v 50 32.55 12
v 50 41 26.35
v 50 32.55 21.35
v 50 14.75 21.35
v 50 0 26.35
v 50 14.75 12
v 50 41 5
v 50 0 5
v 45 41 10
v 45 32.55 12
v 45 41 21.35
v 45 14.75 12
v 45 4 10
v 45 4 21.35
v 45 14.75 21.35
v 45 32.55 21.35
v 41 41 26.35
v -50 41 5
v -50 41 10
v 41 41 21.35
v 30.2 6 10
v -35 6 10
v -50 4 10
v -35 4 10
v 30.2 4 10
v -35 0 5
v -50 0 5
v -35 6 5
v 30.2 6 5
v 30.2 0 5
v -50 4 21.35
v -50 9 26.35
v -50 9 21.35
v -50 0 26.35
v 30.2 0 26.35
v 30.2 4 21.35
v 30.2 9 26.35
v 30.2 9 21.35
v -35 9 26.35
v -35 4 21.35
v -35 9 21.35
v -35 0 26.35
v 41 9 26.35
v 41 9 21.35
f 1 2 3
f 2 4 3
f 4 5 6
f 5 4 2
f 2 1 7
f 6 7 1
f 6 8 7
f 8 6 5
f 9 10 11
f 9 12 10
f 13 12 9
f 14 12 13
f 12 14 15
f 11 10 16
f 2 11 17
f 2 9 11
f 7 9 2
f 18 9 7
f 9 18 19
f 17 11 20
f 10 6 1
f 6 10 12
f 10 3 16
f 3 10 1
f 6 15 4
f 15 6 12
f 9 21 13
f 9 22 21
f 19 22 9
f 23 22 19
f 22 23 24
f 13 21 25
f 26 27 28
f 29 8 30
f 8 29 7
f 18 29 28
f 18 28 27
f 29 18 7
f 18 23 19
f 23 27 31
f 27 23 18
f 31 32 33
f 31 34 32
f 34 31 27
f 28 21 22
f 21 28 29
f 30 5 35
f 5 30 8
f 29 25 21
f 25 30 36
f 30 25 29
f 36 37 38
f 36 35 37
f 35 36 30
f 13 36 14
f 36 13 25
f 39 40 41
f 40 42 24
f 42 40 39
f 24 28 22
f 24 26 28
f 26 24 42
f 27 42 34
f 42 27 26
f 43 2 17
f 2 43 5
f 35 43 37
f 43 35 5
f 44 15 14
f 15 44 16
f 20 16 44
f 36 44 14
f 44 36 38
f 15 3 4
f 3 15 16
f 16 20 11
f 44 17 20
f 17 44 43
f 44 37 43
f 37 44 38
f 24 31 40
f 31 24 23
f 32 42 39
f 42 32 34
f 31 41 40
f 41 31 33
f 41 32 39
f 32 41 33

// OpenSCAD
// file: ../robot_settings.scad
main_box_x = 100; // 96
main_box_y = 102;
main_box_z = 74; // 74.5

lfp_main_box_x = 66;
lfp_main_box_y = 152;
lfp_main_box_z = 93;

wall_thickness = 5;

rail_gap = 2;
rail_inset = 7;

rail_thickness = 7;
rail_length = 250;
 rail_width = 260;

lfp_battery_width = 65.5;
lfp_battery_depth = 150.5;
lfp_battery_height = 93;
lfp_battery_midterrace_width = 64.8;
lfp_battery_midterrace_depth = 150.2;
lfp_battery_midterrace_height = 7.8;
lfp_battery_topterrace_width = 62.8;
lfp_battery_topterrace_depth = 149.4;
lfp_battery_topterrace_height = 6.6;

// red right
// black left
lfp_battery_terminal_width = 9.2;
lfp_battery_terminal_depth = 9.5;
lfp_battery_terminal_depth_setback = 4.4;
lfp_battery_terminal_width_setback = 5.9;

raspberry_pi_screw_seperation_y = 57;
raspberry_pi_screw_seperation_z = 48;
raspberry_pi_peg_h = 5;

battery_box_peg_h = 6;
battery_box_peg_d = 9.5;
battery_box_peg_cutout = 5;

gears_module = 1;
pinion_gear_teeth = 32;
pinion_gear_width = 5;
pinion_gear_bore = 8;

gears_setback_distance = 25;
gear_post_height = 2 * pinion_gear_width + rail_thickness + 8 ;

steering_motor_mount_x = 45;
steering_motor_mount_y = 36;
steering_motor_mount_z = 18;
steering_motor_mount_setback_distance = gears_setback_distance + 16;

dc_motor_drivertype = "Teyleten"; // Teyleten
isAdafruit = (dc_motor_drivertype == "Adafruit");

drv8871_x = isAdafruit ? 20.3 : 21.6;
drv8871_y = isAdafruit ?  24 : 25;

drv8871_z = 2;
drv8871_screw_d = 2.5;
drv8871_solder_points_z = 2;

drv8871mount_edge_x = 1.5;
drv8871mount_edge_wall = 3;
drv8871mount_z = 5;
drv8871mount_x = drv8871_x +  drv8871mount_edge_wall - 2* drv8871mount_edge_x;
drv8871mount_y = 19;

drv8871_screw_distance = 15.64;
drv8871_solder_points_d = 1.66;
drv8871_solder_offset_y = 4.4;
drv8871_solder_inner_points_distance = 5;
drv8871_solder_outer_points_distance = 12;

dc_motor_75_1_encoder_z = 14.75;
dc_motor_75_1_encoder_d = 24.5;
dc_motor_75_1_housing_z = 30;
dc_motor_75_1_housing_d = 24.1;
dc_motor_75_1_gearbox_z = 23;
dc_motor_75_1_gearbox_d = 24.8;
dc_motor_75_1_z = dc_motor_75_1_encoder_z + dc_motor_75_1_housing_z + dc_motor_75_1_gearbox_z;

dc_motor_housing_minus_encoder_z = 48;
dc_motor_encoder_z = 9.33;
dc_motor_encoder_wheel_d = 13.4;
dc_motor_encoder_wheel_thickness = 5;
dc_motor_encoder_wheel_gap = 3;
dc_motor_encoder_circuit_thickness = 2;
dc_motor_z = dc_motor_housing_minus_encoder_z + dc_motor_encoder_z + dc_motor_encoder_wheel_thickness + dc_motor_encoder_wheel_gap + dc_motor_encoder_circuit_thickness;
dc_motor_cutout_d = 24.8;
dc_motor_cutout_z = 19.5;


M3_shaft_d = 2.82;

dc_motor_screw_head_z = 2;
dc_motor_screw_head_d = 5.6;
dc_motor_screw_d = 3.2;
dc_motor_screw_offset = 8.5;

dc_motor_axle_ring_z = 3;
dc_motor_axle_ring_d = 7.2;
dc_motor_axle_cutout_d = 4.2;
dc_motor_axle_cutout_z = 10;
dc_motor_axle_notch_cutout = 0.4;
dc_motor_axle_notch_cutout_z = 6;

pdmount_x = 20;
pdmount_y = 30;
pdmount_z = 2;
pdmount_edge_x = 1.5;
pdmount_edge_wall = 3;

steering_shaft_z = 45;
steering_shaft_d = 7;
steering_shaft_motor_fitting_d = 9;
coupler_length = 24.6;
coupler_diameter = 14;
coupler_screw_d = 4;
coupler_screw_z_offset = 5;
coupler_gear_side_insert = 12.6;
steering_shaft_with_coupler_z = steering_shaft_z - coupler_gear_side_insert;

lidar_mount_y = 110;
lidar_mount_x = 65 + 20;
lidar_narrow_screws = 40;
lidar_wide_screws = 56;
lidar_front_to_back_screws = 70;
lidar_screw_d = 3;
lidar_circuitboard_x = 20;
lidar_circuitboard_y = 35;
lidar_circuitboard_z = 1.2;
lidar_cord_length = 29;

ball_bearing_height = 7;
ball_bearing_outer_diameter = 22;
ball_bearing_inner_diameter = 8;

M4_diameter = 5.1;
M3_diameter = 2.9;
M3_length = 35;
M3_cap_length= 3;
M3_cap_diameter = 5.44;

suspension_spring_outer_diameter = 8;
suspension_spring_inner_diameter = 5.3;

armature_holder_height = 20;
armature_holder_thickness = 8;
pull_bar_peg_r = 3.2;
apparatus_locking_peg_d = 4;

rack_module = 1;
rack_length = main_box_x;
rack_height = 5;
rack_width = 10;
rack_teeth = 30;
rack_bore = 3;

pull_bar_length = rail_width / 2 - rack_length + 1;

// tire hardware
axle_length = 24 + ball_bearing_height; 
axle_reciever_inner_diameter = 8.2;
axle_reciever_outer_diameter = 12;
axle_reciever_length = 18.8;
axle_notch_length = 15;
axle_notch_cutout = 2.4;

// power distribution bar
power_bar_cutout_x = 96;
power_bar_y = 19.1;
power_bar_z = 1.5;
power_bar_screw_distance = 91.4;
power_bar_screw_d = 2.8;
power_bar_standoff_z = 5;
power_bar_standoff_d = 6.83;

pico_expander_width = 63;
pico_expander_height = 57;
pico_screw_hole_offset = 3;
pico_screw_hole_d = 2.5;

usbhub_thickness = 11.7;
usbhub_depth = 37.5;
usbhub_width = 86.7;
usbhub_end_port_width = 14.8;
usbhub_end_port_height = 12;
usbhub_front_face_safe_zone_left = 15;
usbhub_front_face_safe_zone_right = 14.8;

switch_w = 16;
switch_cutout_d = 12.2;
switch_bump_h = 2;
switch_bump_l = 18.2;

i2c_mount_thickness = 3;
i2c_w = 28;
i2c_l = 28;
i2c_circuitboard_thickness = 1.23;
i2c_bottom_notch_w = 14.35;
i2c_bottom_notch_depth = 1;
i2c_screw_hole_d = 1.9;
i2c_screw_hole_offset = 1.4;
i2c_pin_l = 11;
i2c_pin_d = 0.8;
i2c_pin_offset = 1.5;
i2c_pin_separation = 2.5;
i2c_all_pins_l = 8.3;
i2c_screen_thickness = 1.88;
i2c_screen_w = 14.6;
i2c_screen_d = 27;
i2c_screen_offset = 4.1;
// main file
include <../robot_settings.scad>

module targus4mount()
{
   spacer = 5;
  
  translate([-main_box_x / 2, 0, 0]) {
      
      // spacers to allow for better usb fit
      // main spacer
      translate([0, 6,  spacer])
      cube([main_box_x,  35, spacer]);
      
      // right side spacer
      translate([main_box_x -15, 0,  spacer])
      cube([15, usbhub_depth, spacer]);
      
      // small right side wall filler
      translate([main_box_x -19.8, 4, spacer])
      cube([4.8, 2, spacer]);
      
      // left side spacer
     translate([0, 0,  spacer])
      cube([15, usbhub_depth, spacer]);
      
      // holders for Targus 4 port
      difference() {
        // end wall
        translate([main_box_x - 5, 3.2,  usbhub_thickness / 2 ])
        cube([5, usbhub_depth + .3, usbhub_thickness + usbhub_thickness / 2 + spacer - 3]);
        
        // usb cutout
         color("green")
        translate([main_box_x - 6, usbhub_depth / 2 -4 ,  usbhub_end_port_height])
        cube([7, usbhub_end_port_width + 3, usbhub_end_port_height]);
      }

      // end roof
      translate([main_box_x - 9, 3.5,  usbhub_thickness + usbhub_thickness / 2 + spacer - 1.2])
      cube([9, usbhub_depth, 5]);
      
      // side right wall
      translate([main_box_x - usbhub_front_face_safe_zone_right - 5, 0, 5])
      cube([usbhub_front_face_safe_zone_right + 5, 4, usbhub_thickness  + usbhub_thickness / 2 + spacer - 4]);
      
      // side right roof
       translate([main_box_x - usbhub_front_face_safe_zone_right - 5, 0, usbhub_thickness + usbhub_thickness / 2 + spacer - 1.2])
       cube([usbhub_front_face_safe_zone_right + 5, 9, 5]);
     
      // side left wall
      translate([0, 0, 5])
      cube([usbhub_front_face_safe_zone_left , 4, usbhub_thickness  + usbhub_thickness / 2 + spacer - 5]);
      
      // side left roof
      translate([0, 0, usbhub_thickness + usbhub_thickness / 2  + spacer - 1.2])
       cube([usbhub_front_face_safe_zone_left, 9, 5]);
  }
}
targus4mount();
